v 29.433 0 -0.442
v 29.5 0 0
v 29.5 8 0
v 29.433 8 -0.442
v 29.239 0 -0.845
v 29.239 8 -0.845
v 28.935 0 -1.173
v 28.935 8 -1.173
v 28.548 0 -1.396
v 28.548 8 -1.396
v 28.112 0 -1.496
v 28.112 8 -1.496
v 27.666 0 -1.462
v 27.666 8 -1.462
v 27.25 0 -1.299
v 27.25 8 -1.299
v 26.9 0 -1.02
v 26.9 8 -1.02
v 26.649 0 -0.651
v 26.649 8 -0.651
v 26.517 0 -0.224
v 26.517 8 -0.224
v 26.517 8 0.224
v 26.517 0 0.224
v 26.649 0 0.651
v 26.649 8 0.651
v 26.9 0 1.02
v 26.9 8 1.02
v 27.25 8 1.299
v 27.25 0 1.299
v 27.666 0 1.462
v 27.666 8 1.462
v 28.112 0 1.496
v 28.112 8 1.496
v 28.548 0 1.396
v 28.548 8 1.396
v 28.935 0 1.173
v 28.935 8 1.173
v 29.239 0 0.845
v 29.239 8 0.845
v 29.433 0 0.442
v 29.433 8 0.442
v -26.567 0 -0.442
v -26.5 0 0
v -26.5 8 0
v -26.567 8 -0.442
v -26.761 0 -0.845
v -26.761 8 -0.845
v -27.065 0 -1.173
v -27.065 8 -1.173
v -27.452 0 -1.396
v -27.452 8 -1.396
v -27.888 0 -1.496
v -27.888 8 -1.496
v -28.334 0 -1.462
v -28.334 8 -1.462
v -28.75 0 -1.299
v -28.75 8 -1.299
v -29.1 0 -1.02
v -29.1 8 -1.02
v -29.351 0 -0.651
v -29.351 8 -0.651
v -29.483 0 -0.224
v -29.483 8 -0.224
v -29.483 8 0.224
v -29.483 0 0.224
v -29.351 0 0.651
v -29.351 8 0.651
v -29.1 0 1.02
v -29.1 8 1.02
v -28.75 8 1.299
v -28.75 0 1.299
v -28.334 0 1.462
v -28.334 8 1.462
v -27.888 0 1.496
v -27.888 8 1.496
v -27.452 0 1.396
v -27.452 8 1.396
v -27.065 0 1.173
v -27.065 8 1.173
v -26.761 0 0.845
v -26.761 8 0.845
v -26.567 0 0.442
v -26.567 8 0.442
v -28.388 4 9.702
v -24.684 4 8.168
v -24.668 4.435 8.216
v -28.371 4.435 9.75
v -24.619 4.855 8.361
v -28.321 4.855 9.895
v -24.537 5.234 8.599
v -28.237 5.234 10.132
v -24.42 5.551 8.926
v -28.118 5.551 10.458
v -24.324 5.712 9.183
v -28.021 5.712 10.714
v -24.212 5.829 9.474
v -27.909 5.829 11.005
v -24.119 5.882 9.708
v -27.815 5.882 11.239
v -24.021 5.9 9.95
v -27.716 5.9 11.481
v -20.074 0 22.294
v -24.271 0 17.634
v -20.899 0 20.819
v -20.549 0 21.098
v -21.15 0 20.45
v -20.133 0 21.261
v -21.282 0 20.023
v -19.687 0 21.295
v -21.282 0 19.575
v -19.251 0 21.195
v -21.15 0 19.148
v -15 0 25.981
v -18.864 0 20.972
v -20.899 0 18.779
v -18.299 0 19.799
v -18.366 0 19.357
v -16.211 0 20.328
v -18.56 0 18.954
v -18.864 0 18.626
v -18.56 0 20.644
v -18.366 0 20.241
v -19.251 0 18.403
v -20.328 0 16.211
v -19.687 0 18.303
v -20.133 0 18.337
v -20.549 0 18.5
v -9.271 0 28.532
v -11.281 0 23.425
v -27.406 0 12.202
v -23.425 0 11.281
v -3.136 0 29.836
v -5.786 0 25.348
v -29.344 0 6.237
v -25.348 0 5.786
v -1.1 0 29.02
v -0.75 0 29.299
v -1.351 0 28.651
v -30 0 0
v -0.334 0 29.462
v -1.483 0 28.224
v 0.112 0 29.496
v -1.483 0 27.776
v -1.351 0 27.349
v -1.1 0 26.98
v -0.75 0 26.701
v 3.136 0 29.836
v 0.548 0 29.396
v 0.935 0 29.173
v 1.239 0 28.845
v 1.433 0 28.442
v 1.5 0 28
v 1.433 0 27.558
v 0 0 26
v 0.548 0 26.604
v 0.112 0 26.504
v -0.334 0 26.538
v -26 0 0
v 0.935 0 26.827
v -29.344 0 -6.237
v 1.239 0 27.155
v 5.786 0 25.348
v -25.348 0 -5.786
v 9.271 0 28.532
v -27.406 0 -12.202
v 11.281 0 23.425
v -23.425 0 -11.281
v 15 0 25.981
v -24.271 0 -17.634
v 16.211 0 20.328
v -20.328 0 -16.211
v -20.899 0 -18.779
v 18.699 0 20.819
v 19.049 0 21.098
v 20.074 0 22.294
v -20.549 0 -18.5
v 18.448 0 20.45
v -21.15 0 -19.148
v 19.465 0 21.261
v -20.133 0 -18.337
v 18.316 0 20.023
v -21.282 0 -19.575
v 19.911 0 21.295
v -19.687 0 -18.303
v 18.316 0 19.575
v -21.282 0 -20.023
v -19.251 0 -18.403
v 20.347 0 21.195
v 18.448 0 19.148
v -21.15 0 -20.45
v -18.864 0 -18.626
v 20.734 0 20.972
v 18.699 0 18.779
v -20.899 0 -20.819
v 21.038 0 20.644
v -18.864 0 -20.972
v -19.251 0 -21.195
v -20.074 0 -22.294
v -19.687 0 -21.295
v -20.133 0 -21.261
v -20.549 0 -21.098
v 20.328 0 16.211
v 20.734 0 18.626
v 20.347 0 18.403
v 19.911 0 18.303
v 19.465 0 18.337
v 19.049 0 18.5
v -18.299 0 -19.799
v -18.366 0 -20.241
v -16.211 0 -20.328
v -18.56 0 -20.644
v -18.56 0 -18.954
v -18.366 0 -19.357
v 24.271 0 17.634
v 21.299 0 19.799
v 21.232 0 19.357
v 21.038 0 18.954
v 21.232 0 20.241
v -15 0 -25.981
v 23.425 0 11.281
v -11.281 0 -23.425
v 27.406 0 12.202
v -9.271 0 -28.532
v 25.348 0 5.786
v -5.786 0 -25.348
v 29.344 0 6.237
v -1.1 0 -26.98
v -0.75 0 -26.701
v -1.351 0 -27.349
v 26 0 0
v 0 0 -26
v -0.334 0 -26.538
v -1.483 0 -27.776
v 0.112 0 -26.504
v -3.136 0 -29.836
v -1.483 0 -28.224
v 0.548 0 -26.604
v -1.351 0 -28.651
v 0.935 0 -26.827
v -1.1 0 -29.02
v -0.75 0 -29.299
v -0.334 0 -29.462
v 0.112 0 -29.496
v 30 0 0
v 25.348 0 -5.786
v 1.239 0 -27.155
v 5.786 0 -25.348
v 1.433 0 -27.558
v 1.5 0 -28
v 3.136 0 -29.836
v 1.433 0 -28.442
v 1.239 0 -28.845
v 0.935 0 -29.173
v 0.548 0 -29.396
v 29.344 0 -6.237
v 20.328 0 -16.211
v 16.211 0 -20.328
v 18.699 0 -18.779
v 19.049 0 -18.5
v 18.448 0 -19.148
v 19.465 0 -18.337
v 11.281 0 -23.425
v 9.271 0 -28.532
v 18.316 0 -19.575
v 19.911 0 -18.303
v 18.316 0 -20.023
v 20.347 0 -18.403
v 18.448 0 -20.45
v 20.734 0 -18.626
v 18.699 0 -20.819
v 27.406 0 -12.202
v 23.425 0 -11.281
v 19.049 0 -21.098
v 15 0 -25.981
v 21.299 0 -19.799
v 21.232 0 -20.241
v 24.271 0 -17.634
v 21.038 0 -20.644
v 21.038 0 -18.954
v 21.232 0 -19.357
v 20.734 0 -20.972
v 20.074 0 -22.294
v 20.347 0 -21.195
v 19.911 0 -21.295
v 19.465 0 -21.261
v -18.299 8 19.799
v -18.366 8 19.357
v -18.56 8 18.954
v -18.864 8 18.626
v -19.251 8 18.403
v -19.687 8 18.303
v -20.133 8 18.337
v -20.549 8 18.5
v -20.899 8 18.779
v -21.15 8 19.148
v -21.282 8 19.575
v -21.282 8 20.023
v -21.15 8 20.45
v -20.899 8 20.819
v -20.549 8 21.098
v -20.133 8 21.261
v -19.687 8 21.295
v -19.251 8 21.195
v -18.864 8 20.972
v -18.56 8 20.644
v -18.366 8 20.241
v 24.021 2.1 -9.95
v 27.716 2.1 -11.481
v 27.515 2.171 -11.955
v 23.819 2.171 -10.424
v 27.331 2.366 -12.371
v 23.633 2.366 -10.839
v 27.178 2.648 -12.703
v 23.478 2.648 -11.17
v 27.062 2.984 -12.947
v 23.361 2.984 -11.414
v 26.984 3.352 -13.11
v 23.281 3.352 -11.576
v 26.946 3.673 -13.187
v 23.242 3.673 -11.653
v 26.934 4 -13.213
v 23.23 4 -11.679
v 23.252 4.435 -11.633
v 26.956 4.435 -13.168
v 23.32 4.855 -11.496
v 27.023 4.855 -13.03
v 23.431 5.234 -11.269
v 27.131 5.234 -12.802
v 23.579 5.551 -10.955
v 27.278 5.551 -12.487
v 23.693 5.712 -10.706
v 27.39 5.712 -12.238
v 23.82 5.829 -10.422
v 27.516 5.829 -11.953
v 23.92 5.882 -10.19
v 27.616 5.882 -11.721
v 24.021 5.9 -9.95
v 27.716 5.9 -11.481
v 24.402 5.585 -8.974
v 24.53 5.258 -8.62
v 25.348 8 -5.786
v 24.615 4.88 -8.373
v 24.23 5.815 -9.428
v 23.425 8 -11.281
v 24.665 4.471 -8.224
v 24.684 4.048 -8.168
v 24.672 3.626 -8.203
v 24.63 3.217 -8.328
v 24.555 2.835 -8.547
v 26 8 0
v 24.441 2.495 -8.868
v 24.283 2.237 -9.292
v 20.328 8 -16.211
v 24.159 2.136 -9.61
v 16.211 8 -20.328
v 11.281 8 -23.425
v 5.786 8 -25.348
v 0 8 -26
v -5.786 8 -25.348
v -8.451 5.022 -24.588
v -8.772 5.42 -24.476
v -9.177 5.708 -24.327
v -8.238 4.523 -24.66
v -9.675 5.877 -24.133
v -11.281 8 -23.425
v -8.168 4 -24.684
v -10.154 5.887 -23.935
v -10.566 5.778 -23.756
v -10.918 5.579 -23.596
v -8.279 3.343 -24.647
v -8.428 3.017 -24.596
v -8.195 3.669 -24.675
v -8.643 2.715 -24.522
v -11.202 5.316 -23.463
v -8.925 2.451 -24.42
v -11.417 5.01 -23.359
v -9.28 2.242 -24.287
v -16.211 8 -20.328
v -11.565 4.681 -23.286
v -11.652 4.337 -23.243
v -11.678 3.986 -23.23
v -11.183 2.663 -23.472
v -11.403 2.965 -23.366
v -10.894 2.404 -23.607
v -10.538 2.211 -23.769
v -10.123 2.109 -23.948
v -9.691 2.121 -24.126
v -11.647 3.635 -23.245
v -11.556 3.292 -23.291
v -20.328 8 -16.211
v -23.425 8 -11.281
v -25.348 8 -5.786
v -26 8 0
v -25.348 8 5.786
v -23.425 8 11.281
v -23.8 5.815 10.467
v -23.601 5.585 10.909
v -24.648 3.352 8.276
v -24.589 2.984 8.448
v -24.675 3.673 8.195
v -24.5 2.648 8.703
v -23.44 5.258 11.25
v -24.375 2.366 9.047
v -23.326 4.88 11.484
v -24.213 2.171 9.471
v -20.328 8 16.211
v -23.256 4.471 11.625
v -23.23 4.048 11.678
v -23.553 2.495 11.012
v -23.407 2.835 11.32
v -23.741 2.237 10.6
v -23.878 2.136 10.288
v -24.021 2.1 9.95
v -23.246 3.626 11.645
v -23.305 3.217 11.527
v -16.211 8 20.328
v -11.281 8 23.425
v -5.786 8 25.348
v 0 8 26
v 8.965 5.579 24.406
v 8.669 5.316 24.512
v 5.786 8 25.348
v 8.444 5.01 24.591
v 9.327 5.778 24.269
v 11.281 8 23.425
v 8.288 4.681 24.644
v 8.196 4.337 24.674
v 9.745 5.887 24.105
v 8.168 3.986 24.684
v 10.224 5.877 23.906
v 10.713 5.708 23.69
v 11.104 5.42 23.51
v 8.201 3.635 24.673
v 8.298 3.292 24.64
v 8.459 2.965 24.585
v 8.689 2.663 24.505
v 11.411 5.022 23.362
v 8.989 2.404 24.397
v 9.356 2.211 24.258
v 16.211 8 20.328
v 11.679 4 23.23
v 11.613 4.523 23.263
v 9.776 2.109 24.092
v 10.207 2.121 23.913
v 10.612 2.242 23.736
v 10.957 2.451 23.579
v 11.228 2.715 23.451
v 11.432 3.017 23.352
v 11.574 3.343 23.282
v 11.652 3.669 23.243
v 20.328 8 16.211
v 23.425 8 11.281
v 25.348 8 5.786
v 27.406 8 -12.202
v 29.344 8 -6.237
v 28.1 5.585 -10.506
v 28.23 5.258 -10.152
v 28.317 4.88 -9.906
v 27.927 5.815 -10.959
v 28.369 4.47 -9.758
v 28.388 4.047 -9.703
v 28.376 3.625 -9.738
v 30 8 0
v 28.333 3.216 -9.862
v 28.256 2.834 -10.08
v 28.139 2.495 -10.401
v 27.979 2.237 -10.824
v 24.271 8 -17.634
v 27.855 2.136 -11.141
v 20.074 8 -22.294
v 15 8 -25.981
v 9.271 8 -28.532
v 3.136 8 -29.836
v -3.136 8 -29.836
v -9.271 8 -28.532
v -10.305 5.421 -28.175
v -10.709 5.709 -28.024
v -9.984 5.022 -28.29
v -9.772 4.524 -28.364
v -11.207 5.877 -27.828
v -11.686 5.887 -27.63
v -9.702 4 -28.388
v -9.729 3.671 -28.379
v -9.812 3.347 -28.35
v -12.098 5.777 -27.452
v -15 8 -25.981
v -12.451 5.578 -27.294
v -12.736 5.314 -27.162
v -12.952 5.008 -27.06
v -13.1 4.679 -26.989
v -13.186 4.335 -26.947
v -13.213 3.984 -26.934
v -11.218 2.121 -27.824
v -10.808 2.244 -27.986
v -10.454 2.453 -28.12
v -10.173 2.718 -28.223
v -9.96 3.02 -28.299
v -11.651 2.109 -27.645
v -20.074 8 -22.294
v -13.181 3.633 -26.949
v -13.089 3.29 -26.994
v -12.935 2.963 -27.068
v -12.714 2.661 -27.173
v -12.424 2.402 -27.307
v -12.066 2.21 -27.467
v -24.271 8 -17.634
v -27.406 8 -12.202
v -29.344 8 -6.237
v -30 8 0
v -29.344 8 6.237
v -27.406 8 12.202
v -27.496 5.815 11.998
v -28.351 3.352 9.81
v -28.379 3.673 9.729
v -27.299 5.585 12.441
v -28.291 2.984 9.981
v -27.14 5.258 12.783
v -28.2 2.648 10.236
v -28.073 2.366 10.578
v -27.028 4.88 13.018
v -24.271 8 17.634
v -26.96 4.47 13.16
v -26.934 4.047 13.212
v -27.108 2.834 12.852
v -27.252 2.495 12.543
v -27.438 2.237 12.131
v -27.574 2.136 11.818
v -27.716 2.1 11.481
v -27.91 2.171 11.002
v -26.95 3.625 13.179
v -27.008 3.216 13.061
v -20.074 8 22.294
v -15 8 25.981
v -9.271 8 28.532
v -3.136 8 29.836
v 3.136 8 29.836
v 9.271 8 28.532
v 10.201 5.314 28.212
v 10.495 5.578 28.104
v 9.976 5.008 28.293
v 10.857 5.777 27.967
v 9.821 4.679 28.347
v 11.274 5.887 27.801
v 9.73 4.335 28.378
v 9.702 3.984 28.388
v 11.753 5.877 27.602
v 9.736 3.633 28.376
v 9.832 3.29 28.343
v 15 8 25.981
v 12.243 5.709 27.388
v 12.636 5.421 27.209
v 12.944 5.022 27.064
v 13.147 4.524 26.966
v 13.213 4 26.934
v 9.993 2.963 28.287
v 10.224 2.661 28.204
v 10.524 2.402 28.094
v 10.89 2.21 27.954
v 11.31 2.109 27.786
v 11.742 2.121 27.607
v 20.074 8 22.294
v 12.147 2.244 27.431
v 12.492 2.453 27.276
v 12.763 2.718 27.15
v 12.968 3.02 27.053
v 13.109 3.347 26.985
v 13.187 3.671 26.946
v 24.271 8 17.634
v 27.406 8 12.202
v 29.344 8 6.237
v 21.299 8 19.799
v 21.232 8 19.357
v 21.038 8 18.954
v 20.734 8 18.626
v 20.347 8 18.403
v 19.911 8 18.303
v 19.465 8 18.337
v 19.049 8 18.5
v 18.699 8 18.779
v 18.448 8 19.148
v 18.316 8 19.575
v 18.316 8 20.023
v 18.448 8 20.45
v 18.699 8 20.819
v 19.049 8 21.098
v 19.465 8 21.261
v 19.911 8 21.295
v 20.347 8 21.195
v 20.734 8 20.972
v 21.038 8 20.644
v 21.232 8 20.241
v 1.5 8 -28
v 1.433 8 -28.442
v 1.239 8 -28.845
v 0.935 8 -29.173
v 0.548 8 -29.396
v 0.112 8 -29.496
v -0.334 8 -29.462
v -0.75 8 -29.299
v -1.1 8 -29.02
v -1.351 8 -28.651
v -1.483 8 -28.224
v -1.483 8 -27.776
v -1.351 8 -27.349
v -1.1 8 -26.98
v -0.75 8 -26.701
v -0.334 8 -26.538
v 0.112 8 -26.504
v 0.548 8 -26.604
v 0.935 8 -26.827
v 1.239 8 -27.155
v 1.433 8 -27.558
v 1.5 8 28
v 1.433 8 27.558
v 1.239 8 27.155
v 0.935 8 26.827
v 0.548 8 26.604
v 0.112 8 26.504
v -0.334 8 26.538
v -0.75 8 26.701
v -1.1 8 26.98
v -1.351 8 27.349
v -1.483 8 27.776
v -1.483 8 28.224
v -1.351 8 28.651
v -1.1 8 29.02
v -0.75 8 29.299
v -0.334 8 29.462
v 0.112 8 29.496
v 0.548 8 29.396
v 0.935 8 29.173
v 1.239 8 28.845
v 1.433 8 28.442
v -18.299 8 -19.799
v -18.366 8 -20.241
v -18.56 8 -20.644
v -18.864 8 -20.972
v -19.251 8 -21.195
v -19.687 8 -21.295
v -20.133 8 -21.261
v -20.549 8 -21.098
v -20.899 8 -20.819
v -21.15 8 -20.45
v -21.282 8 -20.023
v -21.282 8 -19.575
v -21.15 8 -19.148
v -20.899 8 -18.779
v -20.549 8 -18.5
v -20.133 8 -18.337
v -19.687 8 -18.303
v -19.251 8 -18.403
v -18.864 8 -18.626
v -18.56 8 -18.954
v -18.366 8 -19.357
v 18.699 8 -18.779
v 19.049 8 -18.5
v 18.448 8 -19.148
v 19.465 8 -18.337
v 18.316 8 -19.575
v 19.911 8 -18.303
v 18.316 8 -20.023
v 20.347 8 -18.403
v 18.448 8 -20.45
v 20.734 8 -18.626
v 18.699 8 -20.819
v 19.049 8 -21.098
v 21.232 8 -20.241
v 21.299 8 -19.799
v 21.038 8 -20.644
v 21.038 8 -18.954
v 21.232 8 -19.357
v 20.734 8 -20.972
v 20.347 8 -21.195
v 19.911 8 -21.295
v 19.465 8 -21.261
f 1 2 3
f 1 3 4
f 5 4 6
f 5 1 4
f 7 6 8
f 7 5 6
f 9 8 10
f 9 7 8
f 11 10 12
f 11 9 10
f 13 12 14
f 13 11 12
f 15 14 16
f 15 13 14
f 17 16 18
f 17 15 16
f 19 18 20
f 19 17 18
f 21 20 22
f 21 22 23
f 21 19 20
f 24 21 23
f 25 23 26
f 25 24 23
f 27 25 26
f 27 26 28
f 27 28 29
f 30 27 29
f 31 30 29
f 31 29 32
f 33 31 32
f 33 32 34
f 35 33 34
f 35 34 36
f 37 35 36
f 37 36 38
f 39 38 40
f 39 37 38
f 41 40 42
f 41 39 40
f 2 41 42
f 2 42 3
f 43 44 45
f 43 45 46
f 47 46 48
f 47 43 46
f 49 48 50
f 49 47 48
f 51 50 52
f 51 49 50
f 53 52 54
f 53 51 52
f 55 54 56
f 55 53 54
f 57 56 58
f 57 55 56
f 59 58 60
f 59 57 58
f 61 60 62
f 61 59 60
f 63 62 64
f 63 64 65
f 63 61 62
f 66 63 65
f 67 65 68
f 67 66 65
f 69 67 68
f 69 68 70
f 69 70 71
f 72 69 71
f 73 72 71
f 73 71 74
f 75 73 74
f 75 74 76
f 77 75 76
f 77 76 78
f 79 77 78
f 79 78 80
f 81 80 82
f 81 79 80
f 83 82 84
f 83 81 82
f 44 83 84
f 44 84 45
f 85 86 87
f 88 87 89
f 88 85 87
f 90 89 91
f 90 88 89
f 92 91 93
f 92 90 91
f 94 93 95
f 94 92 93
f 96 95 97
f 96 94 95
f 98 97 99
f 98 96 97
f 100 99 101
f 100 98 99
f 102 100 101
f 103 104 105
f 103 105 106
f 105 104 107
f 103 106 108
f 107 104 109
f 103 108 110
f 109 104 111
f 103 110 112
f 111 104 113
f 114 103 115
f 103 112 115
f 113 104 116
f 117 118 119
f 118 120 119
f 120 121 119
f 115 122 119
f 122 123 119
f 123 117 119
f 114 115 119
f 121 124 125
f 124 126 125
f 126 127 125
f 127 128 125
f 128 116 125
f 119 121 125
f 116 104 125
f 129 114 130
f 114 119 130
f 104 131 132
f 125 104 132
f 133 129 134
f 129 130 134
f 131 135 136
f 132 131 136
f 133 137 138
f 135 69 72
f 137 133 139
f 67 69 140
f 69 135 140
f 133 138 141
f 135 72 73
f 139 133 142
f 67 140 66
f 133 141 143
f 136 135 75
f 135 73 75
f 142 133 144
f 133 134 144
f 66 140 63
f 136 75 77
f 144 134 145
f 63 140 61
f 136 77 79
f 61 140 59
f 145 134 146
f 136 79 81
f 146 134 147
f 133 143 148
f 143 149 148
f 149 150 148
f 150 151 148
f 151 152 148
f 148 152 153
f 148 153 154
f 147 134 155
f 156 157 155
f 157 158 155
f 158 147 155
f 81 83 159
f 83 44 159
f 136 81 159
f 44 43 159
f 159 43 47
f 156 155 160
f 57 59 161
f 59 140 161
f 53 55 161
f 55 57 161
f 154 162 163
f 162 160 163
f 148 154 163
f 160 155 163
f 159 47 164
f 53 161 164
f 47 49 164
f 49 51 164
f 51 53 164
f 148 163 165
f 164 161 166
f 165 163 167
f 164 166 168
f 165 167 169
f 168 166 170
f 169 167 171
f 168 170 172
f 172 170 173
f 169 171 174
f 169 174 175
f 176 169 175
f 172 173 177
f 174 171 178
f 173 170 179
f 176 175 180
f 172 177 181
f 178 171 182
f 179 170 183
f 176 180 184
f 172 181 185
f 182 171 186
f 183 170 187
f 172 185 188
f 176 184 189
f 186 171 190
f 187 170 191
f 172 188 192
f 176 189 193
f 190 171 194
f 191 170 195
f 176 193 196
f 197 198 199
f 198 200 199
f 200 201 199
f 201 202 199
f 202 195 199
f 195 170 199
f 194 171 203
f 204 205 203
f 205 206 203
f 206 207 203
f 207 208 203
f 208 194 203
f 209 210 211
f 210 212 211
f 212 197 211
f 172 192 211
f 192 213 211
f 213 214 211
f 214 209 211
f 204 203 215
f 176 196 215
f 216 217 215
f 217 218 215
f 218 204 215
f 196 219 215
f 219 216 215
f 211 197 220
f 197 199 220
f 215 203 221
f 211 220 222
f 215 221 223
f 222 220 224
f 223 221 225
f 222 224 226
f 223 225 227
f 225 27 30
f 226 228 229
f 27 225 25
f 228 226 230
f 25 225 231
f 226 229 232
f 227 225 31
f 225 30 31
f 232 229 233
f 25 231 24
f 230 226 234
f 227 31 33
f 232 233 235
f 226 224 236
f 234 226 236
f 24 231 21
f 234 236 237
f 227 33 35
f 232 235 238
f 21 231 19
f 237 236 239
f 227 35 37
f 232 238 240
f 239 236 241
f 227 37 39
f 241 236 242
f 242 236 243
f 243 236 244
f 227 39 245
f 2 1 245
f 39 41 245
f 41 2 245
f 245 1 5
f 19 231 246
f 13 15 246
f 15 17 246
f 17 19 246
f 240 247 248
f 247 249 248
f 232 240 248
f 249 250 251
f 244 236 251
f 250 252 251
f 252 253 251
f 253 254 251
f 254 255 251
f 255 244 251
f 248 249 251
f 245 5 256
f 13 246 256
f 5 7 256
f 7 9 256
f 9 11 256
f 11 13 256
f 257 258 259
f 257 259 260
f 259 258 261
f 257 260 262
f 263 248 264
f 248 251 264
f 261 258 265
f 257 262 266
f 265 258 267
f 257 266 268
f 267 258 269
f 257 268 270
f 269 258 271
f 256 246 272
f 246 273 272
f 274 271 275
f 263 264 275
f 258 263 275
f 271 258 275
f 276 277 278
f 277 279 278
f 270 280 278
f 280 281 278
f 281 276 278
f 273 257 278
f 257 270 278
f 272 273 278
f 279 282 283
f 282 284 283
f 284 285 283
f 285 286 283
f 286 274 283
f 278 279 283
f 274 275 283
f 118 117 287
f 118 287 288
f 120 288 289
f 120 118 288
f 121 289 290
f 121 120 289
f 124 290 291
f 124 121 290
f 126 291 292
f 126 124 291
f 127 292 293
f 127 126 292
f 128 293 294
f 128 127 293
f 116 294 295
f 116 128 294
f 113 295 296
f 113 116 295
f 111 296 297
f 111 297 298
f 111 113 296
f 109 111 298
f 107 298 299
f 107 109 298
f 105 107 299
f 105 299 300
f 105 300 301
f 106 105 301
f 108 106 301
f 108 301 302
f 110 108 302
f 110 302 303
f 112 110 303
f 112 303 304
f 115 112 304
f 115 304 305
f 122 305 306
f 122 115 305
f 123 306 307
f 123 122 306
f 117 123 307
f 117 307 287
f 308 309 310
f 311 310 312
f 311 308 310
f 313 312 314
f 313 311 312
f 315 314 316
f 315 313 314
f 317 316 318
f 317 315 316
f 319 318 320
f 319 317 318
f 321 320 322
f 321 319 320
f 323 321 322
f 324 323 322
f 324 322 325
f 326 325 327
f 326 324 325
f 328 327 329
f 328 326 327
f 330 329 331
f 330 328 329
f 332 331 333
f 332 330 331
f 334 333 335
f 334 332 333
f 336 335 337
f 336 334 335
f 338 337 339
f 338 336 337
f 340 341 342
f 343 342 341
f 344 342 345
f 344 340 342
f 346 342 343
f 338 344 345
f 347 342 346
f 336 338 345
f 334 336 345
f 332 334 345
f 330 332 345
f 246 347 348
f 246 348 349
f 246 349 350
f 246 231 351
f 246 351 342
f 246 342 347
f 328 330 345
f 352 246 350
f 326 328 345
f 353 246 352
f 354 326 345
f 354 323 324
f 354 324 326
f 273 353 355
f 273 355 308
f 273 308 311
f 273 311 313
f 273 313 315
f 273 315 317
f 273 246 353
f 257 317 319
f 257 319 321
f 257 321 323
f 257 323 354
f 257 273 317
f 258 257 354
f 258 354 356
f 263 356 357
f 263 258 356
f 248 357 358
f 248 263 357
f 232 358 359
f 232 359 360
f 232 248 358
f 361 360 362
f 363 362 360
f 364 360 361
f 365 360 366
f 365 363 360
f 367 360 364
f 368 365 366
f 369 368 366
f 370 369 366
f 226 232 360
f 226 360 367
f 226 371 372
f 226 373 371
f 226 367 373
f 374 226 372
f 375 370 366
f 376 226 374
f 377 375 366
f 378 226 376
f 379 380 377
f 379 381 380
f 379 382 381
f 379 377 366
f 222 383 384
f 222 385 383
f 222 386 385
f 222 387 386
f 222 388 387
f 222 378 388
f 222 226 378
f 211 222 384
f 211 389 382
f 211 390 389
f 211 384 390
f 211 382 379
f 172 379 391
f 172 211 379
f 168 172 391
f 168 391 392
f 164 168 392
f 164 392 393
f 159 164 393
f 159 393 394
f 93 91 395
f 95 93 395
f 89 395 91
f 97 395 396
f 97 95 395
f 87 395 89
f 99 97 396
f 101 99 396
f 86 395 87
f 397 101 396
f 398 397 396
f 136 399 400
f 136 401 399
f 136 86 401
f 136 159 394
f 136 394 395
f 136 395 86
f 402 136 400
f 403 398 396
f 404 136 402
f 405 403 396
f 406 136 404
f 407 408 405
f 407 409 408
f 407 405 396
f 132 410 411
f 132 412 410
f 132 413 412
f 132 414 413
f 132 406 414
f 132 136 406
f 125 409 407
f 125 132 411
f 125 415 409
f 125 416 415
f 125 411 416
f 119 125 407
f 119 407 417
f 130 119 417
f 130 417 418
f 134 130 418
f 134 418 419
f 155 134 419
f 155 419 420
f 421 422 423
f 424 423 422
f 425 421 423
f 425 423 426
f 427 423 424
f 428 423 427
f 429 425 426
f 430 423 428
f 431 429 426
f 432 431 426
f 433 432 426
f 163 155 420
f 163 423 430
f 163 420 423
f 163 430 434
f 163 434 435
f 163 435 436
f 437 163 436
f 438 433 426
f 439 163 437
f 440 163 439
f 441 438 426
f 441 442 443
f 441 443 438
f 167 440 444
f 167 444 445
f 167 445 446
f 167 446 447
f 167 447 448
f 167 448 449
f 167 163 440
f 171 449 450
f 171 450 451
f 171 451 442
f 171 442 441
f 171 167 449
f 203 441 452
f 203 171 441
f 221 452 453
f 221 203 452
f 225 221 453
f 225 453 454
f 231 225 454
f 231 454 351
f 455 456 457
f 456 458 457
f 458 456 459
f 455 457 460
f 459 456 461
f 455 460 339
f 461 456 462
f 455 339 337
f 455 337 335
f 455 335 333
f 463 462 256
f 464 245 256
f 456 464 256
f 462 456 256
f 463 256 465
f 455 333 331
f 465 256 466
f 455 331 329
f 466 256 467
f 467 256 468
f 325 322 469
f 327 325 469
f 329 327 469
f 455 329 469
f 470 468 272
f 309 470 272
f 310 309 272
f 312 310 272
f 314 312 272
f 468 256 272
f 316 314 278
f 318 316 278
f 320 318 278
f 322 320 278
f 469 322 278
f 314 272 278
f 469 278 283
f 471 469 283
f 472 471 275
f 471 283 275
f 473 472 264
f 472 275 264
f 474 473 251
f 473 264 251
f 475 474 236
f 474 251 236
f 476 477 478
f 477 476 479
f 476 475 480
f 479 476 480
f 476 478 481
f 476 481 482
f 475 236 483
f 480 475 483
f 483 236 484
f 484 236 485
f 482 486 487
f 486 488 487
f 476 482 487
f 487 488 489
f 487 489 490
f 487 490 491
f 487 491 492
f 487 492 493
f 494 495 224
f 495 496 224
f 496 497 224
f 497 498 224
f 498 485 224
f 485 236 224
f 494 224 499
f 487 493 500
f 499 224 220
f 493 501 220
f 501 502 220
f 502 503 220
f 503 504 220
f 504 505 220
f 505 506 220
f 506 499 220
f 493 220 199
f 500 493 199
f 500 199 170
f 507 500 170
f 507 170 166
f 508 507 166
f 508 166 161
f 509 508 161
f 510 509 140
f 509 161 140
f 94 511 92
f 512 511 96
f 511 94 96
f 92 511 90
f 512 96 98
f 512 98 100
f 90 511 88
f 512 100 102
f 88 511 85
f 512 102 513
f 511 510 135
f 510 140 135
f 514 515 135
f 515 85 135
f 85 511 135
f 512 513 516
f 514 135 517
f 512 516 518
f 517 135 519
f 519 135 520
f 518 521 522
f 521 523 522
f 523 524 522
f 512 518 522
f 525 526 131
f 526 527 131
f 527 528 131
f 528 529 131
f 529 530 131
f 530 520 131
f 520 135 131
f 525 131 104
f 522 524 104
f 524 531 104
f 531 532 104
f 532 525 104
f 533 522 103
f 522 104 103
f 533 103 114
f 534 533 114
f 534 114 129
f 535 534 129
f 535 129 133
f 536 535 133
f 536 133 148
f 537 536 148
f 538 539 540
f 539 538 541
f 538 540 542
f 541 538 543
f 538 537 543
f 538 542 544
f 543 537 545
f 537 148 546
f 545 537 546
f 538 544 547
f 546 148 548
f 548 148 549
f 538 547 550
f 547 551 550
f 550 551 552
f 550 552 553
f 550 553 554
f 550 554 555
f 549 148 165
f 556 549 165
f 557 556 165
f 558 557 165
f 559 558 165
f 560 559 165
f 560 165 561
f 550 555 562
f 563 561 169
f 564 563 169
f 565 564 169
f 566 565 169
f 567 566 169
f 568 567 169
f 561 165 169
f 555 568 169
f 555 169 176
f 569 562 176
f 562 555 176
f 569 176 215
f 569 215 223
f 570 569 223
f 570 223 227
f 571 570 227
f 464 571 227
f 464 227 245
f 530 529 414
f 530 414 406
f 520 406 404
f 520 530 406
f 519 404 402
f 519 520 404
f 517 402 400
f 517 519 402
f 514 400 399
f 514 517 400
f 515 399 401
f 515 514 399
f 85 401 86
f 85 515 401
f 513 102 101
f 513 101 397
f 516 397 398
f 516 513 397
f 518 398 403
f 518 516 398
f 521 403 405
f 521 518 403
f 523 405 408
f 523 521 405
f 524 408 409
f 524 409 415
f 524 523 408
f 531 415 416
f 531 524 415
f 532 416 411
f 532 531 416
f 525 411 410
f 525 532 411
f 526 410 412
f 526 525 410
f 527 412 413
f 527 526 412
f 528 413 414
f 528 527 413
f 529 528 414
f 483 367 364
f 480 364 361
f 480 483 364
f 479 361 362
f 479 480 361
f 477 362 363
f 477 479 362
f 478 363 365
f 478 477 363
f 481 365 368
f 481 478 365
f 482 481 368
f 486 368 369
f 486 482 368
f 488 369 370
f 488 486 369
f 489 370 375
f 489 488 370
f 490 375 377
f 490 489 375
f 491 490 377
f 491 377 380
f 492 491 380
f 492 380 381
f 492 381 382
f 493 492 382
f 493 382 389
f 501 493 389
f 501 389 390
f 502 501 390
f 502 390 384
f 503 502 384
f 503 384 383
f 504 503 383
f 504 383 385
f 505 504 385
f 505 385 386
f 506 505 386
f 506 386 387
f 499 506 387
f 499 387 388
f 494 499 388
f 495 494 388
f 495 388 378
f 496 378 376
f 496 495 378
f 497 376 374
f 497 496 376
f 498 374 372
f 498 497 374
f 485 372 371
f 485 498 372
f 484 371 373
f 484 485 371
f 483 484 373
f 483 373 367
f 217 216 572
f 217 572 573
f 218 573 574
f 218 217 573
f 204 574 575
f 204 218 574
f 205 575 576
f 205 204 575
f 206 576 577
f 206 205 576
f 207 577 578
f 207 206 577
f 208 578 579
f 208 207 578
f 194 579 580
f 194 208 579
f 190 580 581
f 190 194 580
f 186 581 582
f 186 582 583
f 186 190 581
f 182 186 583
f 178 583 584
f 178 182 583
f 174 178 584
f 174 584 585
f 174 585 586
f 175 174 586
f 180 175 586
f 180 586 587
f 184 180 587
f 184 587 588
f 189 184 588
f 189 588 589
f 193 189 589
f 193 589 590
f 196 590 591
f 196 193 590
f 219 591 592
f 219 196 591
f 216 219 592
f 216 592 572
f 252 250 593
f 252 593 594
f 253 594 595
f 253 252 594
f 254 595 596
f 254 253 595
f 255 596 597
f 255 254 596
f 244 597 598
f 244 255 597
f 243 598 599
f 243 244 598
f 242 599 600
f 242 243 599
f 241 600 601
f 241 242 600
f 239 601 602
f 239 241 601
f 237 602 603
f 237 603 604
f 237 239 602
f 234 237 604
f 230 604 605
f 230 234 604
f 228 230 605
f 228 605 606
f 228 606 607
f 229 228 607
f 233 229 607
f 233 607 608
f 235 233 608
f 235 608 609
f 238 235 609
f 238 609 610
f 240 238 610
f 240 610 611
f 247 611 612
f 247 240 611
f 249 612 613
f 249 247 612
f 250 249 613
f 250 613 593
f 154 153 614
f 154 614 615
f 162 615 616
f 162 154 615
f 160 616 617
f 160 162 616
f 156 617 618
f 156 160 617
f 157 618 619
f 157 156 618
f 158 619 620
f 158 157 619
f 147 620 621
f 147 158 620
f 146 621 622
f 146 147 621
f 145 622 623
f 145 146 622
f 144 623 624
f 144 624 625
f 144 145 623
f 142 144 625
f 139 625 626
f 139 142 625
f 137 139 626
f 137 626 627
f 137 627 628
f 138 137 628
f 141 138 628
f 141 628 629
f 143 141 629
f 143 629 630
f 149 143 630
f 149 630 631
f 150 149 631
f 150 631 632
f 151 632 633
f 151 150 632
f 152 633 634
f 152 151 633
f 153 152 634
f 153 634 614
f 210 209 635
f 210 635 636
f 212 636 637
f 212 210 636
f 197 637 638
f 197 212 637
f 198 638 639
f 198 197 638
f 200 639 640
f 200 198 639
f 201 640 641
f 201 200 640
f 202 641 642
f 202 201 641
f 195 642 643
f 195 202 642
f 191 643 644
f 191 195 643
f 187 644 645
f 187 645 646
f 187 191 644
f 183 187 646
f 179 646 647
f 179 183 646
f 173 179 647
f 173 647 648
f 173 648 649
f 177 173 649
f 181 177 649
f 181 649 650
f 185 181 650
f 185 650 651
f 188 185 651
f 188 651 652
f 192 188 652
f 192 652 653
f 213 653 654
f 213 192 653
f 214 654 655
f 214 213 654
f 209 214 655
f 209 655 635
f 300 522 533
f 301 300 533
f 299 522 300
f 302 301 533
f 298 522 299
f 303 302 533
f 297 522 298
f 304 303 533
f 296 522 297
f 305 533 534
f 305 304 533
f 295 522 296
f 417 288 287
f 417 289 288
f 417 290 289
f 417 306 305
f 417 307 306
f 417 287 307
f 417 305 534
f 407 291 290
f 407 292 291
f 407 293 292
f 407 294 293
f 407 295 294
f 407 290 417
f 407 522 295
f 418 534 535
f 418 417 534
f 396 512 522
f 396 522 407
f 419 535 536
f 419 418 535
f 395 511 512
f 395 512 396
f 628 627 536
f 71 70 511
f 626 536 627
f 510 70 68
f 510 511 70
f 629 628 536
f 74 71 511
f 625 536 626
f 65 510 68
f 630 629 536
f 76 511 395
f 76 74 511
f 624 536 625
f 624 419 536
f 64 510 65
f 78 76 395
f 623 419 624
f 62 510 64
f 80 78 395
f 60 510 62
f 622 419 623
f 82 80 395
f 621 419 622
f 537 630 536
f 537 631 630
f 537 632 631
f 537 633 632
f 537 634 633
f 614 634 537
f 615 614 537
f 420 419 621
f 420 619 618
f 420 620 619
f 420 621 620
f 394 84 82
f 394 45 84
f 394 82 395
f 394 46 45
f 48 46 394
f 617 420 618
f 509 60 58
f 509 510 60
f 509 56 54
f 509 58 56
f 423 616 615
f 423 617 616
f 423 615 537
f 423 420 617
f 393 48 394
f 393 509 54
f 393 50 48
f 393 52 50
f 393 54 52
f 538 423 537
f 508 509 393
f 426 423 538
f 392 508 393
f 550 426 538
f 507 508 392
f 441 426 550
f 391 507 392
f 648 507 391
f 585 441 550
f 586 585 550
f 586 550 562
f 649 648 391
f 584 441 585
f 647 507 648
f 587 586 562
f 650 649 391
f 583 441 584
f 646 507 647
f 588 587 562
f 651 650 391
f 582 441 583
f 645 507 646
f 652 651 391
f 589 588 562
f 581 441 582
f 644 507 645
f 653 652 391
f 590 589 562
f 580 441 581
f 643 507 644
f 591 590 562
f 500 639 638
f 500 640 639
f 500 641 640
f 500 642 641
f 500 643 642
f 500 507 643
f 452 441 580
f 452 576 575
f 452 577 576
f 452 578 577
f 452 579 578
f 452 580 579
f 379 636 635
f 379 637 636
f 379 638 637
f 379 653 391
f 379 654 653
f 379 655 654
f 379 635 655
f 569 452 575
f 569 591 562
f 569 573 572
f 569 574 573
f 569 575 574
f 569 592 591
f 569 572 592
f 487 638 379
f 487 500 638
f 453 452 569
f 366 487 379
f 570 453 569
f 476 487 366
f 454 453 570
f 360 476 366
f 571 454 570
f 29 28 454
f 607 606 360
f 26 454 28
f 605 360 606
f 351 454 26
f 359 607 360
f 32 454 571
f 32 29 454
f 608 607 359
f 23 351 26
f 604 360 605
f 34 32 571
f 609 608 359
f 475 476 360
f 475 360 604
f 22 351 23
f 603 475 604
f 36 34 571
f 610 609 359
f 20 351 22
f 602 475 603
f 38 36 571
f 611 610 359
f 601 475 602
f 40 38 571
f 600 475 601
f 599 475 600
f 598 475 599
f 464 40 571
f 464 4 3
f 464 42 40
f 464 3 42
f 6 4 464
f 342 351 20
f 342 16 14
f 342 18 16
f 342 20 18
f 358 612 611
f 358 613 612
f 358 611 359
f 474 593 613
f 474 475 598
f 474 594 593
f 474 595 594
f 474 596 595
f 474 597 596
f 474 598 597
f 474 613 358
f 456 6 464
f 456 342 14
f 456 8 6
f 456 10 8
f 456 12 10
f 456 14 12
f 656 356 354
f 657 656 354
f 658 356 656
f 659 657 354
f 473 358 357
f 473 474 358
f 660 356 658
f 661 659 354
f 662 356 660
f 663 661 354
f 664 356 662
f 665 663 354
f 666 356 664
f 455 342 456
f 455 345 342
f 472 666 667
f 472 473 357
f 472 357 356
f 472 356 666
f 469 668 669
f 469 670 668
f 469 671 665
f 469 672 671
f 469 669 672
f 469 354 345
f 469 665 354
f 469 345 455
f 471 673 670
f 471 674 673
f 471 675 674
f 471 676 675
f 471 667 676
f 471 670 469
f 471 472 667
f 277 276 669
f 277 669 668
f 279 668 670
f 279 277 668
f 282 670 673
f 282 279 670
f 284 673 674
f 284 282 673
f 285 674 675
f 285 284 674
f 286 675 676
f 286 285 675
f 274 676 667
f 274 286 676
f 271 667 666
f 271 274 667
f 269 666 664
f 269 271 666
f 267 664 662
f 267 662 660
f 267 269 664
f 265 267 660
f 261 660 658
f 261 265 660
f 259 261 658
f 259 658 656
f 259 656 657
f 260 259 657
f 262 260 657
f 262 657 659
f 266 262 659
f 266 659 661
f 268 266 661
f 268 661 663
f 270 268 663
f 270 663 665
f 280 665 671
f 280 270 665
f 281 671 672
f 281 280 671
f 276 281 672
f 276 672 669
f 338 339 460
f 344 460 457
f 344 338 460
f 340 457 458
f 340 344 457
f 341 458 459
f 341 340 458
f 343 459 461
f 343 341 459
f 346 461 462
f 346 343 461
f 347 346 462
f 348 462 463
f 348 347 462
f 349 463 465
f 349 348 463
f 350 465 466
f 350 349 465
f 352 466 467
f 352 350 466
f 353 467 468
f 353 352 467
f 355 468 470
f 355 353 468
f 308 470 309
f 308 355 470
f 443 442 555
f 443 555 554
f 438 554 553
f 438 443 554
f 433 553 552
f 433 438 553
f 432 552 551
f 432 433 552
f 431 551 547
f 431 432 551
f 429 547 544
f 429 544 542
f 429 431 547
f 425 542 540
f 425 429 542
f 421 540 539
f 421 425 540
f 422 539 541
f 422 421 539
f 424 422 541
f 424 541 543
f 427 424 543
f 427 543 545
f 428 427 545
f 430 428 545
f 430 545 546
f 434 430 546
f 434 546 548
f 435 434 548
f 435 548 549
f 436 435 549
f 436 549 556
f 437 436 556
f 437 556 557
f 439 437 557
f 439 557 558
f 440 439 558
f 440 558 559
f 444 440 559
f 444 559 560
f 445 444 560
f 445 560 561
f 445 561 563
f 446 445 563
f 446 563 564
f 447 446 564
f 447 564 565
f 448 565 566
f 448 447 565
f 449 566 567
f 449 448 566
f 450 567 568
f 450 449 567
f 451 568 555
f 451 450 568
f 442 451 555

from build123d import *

# Parameters (mm, degrees)
EXTRUDE_1_OUTLINE_R      = 30
EXTRUDE_1_OUTLINE_R_2    = 1.5
EXTRUDE_1_OUTLINE_R_3    = 26
EXTRUDE_1_DEPTH          = 8
CUT_EXTRUDE_1_DEPTH      = 44.17406629
CUT_EXTRUDE_1_DEPTH_BACK = 44.17406629
CUT_EXTRUDE_2_DEPTH      = 44.174066447
CUT_EXTRUDE_2_DEPTH_BACK = 44.174066447
SKETCH_5_R               = 1.9


# Read off the part's stored shape, not the designer's step: 凸台-拉伸1
with BuildPart() as part:
    # 凸台-拉伸1 outline → 凸台-拉伸1 (new body)
    with BuildSketch(Plane(origin=(0, 0, 0), x_dir=(1, 0, 0), z_dir=(0, 1, 0))):
        Circle(EXTRUDE_1_OUTLINE_R)
        with Locations((-19.798989873, -19.798989873)):
            Circle(EXTRUDE_1_OUTLINE_R_2, mode=Mode.SUBTRACT)
        with Locations((0, -28)):
            Circle(EXTRUDE_1_OUTLINE_R_2, mode=Mode.SUBTRACT)
        with Locations((19.798989873, -19.798989873)):
            Circle(EXTRUDE_1_OUTLINE_R_2, mode=Mode.SUBTRACT)
        with Locations((-28, 0)):
            Circle(EXTRUDE_1_OUTLINE_R_2, mode=Mode.SUBTRACT)
        with Locations((-19.798989873, 19.798989873)):
            Circle(EXTRUDE_1_OUTLINE_R_2, mode=Mode.SUBTRACT)
        Circle(EXTRUDE_1_OUTLINE_R_3, mode=Mode.SUBTRACT)
        with Locations((28, 0)):
            Circle(EXTRUDE_1_OUTLINE_R_2, mode=Mode.SUBTRACT)
        with Locations((0, 28)):
            Circle(EXTRUDE_1_OUTLINE_R_2, mode=Mode.SUBTRACT)
        with Locations((19.798989873, 19.798989873)):
            Circle(EXTRUDE_1_OUTLINE_R_2, mode=Mode.SUBTRACT)
    extrude(amount=EXTRUDE_1_DEPTH)

    # 草图4 → 切除-拉伸1 (cut, two sides: drawn at the far end of the back side and taken through both)
    with BuildSketch(Plane(origin=(0, 0, 0), x_dir=(-0.38268343236509067, 0, -0.9238795325112864), z_dir=(0.9238795325112864, 0, -0.38268343236509067)).offset(-CUT_EXTRUDE_1_DEPTH_BACK)):
        with BuildLine():
            ThreePointArc((0, 5.9), (-1.9, 4), (0, 2.1))
            Line((0, 2.1), (0, 5.9))
        make_face()
        with BuildLine():
            Line((0, 5.9), (0, 2.1))
            ThreePointArc((0, 2.1), (1.343502884, 2.656497116), (1.9, 4))
            ThreePointArc((1.9, 4), (1.343502884, 5.343502884), (0, 5.9))
        make_face()
    extrude(amount=CUT_EXTRUDE_1_DEPTH + CUT_EXTRUDE_1_DEPTH_BACK, mode=Mode.SUBTRACT)

    # 草图5 → 切除-拉伸2 (cut, two sides: drawn at the far end of the back side and taken through both)
    with BuildSketch(Plane(origin=(0, 0, 0), x_dir=(0.9238795325112864, 0, -0.3826834323650906), z_dir=(0.3826834323650906, 0, 0.9238795325112864)).offset(-CUT_EXTRUDE_2_DEPTH_BACK)):
        with Locations((0, 4)):
            Circle(SKETCH_5_R)
    extrude(amount=CUT_EXTRUDE_2_DEPTH + CUT_EXTRUDE_2_DEPTH_BACK, mode=Mode.SUBTRACT)


solid = part.part
